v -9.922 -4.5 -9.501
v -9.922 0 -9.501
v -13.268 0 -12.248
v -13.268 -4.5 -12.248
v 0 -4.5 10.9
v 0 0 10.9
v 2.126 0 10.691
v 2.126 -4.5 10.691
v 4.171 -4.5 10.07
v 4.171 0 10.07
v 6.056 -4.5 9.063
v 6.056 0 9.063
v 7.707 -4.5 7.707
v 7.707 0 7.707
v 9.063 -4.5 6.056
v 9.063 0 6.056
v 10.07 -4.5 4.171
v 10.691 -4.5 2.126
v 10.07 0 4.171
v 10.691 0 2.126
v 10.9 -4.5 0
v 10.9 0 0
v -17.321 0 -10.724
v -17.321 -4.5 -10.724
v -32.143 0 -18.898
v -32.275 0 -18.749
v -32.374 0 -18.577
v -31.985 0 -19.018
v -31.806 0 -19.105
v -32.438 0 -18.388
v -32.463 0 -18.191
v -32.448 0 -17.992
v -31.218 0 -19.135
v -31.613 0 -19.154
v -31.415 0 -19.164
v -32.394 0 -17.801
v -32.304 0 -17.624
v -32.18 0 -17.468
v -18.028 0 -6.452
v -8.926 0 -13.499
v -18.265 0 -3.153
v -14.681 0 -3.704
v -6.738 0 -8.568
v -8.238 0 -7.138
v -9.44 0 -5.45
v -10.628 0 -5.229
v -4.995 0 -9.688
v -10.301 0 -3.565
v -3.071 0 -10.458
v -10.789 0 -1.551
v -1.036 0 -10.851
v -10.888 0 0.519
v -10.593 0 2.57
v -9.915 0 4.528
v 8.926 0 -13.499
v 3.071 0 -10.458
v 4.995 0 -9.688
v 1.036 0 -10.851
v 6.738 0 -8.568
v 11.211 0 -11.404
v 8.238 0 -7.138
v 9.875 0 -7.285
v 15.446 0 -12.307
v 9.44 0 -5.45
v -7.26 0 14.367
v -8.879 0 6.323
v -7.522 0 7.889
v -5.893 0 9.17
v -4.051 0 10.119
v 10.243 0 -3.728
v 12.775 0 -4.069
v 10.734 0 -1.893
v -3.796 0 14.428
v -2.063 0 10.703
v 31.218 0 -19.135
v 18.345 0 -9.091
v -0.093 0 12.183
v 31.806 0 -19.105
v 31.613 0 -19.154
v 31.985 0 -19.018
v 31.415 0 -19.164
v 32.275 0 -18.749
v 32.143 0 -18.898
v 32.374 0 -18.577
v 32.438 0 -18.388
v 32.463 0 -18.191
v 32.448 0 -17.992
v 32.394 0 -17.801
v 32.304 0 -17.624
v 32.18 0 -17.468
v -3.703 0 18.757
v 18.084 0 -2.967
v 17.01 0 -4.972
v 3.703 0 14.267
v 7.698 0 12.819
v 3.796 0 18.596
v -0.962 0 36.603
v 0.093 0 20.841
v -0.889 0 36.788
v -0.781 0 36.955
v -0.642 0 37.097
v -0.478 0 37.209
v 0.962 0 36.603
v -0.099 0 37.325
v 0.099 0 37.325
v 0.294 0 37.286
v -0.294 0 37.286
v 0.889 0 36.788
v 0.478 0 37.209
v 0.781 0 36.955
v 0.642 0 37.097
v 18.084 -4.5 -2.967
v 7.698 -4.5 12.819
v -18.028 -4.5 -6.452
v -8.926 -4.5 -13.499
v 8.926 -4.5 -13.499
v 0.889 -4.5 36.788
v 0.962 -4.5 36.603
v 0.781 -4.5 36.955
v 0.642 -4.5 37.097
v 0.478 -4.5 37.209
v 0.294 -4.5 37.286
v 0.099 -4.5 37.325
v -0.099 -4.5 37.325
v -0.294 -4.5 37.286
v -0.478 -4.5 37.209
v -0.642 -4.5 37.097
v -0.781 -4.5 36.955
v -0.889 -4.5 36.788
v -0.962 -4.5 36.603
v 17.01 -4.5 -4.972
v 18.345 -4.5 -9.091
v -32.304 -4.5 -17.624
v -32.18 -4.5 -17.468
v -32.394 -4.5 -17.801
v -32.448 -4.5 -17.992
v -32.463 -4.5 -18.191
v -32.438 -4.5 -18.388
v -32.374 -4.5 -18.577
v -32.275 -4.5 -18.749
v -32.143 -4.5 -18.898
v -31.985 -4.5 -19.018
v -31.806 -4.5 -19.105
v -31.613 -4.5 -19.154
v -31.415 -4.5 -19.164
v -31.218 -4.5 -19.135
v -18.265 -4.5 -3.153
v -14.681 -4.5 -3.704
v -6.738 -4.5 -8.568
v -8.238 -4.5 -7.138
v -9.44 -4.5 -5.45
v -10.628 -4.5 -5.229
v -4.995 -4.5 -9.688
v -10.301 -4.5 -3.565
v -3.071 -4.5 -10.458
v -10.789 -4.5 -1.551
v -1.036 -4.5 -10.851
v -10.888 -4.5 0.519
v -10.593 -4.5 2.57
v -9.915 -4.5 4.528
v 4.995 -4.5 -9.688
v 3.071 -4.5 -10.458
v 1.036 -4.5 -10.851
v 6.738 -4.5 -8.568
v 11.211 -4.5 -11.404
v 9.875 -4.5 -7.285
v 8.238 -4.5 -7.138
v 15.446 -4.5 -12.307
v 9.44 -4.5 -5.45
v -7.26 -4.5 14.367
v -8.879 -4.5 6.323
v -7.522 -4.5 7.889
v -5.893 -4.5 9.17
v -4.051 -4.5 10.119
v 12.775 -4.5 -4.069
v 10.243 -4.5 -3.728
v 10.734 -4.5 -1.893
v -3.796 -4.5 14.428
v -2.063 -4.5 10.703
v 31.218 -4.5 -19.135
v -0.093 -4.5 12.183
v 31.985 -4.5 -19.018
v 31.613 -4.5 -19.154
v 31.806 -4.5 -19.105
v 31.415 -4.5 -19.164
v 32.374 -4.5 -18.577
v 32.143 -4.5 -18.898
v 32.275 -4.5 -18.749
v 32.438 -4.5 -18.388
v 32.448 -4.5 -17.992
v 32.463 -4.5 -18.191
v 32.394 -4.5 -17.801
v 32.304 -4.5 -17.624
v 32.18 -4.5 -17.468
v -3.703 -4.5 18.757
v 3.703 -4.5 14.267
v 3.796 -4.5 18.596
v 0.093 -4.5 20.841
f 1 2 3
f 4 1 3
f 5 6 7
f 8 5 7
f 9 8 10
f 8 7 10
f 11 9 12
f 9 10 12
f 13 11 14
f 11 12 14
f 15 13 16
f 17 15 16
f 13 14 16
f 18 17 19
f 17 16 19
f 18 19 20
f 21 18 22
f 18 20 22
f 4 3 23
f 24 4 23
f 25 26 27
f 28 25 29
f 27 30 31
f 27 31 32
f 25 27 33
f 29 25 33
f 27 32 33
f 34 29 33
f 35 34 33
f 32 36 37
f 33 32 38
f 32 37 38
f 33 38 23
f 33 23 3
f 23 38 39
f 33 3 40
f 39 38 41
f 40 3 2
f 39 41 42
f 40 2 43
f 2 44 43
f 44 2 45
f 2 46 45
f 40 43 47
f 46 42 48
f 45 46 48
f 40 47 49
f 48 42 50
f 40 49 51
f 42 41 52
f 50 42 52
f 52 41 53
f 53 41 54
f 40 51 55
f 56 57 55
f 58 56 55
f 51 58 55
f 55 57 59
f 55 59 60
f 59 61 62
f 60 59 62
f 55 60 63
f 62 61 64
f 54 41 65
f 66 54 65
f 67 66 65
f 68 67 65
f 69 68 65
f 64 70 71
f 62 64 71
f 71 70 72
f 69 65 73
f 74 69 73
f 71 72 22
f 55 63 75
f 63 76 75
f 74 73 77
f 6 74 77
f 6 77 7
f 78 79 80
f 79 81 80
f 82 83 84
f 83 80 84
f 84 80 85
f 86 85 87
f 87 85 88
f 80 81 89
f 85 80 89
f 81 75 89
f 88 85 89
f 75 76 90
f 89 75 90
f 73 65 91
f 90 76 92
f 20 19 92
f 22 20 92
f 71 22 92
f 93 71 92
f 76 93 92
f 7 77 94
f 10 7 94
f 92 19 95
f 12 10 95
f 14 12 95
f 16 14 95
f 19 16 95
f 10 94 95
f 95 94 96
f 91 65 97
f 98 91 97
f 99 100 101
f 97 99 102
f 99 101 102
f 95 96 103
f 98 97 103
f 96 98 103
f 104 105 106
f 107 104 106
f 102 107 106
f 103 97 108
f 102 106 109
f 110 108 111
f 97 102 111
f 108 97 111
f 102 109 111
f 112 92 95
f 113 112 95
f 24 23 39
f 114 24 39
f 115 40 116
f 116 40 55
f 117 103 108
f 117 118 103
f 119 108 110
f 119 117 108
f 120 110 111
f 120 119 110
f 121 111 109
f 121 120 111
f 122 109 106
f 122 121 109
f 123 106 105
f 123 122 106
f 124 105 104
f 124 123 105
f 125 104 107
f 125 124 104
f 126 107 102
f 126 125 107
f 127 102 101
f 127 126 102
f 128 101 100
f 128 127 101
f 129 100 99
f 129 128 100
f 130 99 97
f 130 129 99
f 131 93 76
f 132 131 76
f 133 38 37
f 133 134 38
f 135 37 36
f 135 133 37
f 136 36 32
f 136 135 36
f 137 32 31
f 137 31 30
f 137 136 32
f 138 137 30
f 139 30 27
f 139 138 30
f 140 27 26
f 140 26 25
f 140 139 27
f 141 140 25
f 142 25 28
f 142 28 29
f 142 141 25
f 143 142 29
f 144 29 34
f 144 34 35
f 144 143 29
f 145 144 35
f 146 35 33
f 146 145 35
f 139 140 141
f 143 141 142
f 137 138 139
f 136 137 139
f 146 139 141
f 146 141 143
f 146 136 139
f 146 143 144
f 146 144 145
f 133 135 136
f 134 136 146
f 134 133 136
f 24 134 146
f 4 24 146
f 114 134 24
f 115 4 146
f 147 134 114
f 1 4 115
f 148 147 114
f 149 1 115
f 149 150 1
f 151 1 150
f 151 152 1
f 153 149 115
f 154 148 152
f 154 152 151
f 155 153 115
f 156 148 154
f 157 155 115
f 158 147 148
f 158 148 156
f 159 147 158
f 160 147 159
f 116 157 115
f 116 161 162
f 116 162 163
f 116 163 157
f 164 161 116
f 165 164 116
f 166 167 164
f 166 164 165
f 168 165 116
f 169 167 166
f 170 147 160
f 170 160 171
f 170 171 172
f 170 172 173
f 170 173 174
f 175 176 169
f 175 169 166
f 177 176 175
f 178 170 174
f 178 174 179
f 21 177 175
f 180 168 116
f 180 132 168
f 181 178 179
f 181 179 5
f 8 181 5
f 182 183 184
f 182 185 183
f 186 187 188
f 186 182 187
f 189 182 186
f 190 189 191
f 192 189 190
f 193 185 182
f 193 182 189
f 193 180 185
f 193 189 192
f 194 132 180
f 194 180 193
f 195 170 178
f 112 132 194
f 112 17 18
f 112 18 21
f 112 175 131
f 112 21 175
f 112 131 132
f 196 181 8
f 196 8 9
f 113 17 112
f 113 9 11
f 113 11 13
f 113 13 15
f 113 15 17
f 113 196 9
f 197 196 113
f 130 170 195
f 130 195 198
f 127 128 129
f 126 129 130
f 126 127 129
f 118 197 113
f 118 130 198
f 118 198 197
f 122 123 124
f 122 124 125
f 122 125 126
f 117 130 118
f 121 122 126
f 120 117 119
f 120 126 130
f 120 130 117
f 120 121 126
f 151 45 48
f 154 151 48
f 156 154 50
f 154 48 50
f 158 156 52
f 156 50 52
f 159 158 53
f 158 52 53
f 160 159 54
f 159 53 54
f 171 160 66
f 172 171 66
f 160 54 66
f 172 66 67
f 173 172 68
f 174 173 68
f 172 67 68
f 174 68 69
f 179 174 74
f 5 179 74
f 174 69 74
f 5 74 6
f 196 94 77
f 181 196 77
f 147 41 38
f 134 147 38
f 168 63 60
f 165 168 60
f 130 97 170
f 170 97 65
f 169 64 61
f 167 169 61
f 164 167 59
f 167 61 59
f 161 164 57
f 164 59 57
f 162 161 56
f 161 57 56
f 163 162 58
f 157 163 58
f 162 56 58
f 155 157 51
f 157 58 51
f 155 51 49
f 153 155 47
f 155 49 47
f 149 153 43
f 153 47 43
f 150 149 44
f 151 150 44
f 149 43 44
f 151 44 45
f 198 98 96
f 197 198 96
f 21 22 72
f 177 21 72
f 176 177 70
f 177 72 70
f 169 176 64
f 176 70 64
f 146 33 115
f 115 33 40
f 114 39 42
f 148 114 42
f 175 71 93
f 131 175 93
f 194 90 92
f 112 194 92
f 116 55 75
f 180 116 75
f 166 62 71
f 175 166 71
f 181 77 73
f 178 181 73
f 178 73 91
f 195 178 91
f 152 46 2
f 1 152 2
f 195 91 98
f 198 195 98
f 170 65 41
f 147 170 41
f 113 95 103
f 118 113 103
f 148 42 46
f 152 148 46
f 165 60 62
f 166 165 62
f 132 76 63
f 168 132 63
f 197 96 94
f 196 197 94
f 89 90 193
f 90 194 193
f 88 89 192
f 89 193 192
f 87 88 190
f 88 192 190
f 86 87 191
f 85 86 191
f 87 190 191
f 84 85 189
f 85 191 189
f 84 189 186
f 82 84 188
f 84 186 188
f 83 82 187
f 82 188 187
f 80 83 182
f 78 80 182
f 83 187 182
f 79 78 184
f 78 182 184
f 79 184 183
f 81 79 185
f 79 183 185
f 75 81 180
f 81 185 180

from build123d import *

# Parameters (mm, degrees)
F1_DEPTH = 4.5
F2_R     = 1
F4_DEPTH = 25


with BuildPart() as f1:
    # F0 (on Front) → F1 (new body)
    with BuildSketch(Plane.XZ):
        with BuildLine():
            ThreePointArc((0, 10.9), (7.707464, 7.707464), (10.9, 0))
            ThreePointArc((10.9, 0), (10.528592, -2.821128), (9.439677, -5.45))
            Line((9.439677, -5.45), (34.641016, -20))
            Line((34.641016, -20), (18.084448, -2.966725))
            Line((18.084448, -2.966725), (7.698172, 12.818934))
            Line((7.698172, 12.818934), (0, 40))
            Line((0, 40), (0, 10.9))
        make_face()
        with BuildLine():
            ThreePointArc((-9.439677, -5.45), (-9.439677, 5.45), (0, 10.9))
            Line((0, 10.9), (0, 40))
            Line((0, 40), (-7.25986, 14.366547))
            Line((-7.25986, 14.366547), (-18.265326, -3.152812))
            Line((-18.265326, -3.152812), (-34.641016, -20))
            Line((-34.641016, -20), (-9.439677, -5.45))
        make_face()
        with BuildLine():
            Line((34.641016, -20), (9.439677, -5.45))
            ThreePointArc((9.439677, -5.45), (0, -10.9), (-9.439677, -5.45))
            Line((-9.439677, -5.45), (-34.641016, -20))
            Line((-34.641016, -20), (-8.926296, -13.499424))
            Line((-8.926296, -13.499424), (8.926296, -13.499424))
            Line((8.926296, -13.499424), (34.641016, -20))
        make_face()
    extrude(amount=F1_DEPTH)

    # F2
    f2_edges = [f1.edges().sort_by_distance(p)[0] for p in [
        (0, -2.25, 40),
        (34.641016, -2.25, -20),
        (-34.641016, -2.25, -20),
    ]]
    fillet(f2_edges, radius=F2_R)

    # F3 (on face) → F4 (cut)
    with BuildSketch(Plane(origin=(0, 0, 0), x_dir=(-1, 0, 0), z_dir=(0, 1, 0))):
        Polygon((-11.210982, -11.404401), (-9.875284, -7.285431), (-12.774568, -4.069198), (-17.009549, -4.971935), (-18.345247, -9.090904), (-15.445963, -12.307137), align=None)
        Polygon((17.32114, -10.724252), (18.027603, -6.452143), (14.68108, -3.704275), (10.628094, -5.228514), (9.921631, -9.500623), (13.268154, -12.248491), align=None)
        Polygon((0.09283, 12.183193), (3.795553, 14.428152), (3.702723, 18.757284), (-0.09283, 20.841457), (-3.795553, 18.596498), (-3.702723, 14.267366), align=None)
    extrude(amount=-F4_DEPTH, mode=Mode.SUBTRACT)


solid = f1.part
